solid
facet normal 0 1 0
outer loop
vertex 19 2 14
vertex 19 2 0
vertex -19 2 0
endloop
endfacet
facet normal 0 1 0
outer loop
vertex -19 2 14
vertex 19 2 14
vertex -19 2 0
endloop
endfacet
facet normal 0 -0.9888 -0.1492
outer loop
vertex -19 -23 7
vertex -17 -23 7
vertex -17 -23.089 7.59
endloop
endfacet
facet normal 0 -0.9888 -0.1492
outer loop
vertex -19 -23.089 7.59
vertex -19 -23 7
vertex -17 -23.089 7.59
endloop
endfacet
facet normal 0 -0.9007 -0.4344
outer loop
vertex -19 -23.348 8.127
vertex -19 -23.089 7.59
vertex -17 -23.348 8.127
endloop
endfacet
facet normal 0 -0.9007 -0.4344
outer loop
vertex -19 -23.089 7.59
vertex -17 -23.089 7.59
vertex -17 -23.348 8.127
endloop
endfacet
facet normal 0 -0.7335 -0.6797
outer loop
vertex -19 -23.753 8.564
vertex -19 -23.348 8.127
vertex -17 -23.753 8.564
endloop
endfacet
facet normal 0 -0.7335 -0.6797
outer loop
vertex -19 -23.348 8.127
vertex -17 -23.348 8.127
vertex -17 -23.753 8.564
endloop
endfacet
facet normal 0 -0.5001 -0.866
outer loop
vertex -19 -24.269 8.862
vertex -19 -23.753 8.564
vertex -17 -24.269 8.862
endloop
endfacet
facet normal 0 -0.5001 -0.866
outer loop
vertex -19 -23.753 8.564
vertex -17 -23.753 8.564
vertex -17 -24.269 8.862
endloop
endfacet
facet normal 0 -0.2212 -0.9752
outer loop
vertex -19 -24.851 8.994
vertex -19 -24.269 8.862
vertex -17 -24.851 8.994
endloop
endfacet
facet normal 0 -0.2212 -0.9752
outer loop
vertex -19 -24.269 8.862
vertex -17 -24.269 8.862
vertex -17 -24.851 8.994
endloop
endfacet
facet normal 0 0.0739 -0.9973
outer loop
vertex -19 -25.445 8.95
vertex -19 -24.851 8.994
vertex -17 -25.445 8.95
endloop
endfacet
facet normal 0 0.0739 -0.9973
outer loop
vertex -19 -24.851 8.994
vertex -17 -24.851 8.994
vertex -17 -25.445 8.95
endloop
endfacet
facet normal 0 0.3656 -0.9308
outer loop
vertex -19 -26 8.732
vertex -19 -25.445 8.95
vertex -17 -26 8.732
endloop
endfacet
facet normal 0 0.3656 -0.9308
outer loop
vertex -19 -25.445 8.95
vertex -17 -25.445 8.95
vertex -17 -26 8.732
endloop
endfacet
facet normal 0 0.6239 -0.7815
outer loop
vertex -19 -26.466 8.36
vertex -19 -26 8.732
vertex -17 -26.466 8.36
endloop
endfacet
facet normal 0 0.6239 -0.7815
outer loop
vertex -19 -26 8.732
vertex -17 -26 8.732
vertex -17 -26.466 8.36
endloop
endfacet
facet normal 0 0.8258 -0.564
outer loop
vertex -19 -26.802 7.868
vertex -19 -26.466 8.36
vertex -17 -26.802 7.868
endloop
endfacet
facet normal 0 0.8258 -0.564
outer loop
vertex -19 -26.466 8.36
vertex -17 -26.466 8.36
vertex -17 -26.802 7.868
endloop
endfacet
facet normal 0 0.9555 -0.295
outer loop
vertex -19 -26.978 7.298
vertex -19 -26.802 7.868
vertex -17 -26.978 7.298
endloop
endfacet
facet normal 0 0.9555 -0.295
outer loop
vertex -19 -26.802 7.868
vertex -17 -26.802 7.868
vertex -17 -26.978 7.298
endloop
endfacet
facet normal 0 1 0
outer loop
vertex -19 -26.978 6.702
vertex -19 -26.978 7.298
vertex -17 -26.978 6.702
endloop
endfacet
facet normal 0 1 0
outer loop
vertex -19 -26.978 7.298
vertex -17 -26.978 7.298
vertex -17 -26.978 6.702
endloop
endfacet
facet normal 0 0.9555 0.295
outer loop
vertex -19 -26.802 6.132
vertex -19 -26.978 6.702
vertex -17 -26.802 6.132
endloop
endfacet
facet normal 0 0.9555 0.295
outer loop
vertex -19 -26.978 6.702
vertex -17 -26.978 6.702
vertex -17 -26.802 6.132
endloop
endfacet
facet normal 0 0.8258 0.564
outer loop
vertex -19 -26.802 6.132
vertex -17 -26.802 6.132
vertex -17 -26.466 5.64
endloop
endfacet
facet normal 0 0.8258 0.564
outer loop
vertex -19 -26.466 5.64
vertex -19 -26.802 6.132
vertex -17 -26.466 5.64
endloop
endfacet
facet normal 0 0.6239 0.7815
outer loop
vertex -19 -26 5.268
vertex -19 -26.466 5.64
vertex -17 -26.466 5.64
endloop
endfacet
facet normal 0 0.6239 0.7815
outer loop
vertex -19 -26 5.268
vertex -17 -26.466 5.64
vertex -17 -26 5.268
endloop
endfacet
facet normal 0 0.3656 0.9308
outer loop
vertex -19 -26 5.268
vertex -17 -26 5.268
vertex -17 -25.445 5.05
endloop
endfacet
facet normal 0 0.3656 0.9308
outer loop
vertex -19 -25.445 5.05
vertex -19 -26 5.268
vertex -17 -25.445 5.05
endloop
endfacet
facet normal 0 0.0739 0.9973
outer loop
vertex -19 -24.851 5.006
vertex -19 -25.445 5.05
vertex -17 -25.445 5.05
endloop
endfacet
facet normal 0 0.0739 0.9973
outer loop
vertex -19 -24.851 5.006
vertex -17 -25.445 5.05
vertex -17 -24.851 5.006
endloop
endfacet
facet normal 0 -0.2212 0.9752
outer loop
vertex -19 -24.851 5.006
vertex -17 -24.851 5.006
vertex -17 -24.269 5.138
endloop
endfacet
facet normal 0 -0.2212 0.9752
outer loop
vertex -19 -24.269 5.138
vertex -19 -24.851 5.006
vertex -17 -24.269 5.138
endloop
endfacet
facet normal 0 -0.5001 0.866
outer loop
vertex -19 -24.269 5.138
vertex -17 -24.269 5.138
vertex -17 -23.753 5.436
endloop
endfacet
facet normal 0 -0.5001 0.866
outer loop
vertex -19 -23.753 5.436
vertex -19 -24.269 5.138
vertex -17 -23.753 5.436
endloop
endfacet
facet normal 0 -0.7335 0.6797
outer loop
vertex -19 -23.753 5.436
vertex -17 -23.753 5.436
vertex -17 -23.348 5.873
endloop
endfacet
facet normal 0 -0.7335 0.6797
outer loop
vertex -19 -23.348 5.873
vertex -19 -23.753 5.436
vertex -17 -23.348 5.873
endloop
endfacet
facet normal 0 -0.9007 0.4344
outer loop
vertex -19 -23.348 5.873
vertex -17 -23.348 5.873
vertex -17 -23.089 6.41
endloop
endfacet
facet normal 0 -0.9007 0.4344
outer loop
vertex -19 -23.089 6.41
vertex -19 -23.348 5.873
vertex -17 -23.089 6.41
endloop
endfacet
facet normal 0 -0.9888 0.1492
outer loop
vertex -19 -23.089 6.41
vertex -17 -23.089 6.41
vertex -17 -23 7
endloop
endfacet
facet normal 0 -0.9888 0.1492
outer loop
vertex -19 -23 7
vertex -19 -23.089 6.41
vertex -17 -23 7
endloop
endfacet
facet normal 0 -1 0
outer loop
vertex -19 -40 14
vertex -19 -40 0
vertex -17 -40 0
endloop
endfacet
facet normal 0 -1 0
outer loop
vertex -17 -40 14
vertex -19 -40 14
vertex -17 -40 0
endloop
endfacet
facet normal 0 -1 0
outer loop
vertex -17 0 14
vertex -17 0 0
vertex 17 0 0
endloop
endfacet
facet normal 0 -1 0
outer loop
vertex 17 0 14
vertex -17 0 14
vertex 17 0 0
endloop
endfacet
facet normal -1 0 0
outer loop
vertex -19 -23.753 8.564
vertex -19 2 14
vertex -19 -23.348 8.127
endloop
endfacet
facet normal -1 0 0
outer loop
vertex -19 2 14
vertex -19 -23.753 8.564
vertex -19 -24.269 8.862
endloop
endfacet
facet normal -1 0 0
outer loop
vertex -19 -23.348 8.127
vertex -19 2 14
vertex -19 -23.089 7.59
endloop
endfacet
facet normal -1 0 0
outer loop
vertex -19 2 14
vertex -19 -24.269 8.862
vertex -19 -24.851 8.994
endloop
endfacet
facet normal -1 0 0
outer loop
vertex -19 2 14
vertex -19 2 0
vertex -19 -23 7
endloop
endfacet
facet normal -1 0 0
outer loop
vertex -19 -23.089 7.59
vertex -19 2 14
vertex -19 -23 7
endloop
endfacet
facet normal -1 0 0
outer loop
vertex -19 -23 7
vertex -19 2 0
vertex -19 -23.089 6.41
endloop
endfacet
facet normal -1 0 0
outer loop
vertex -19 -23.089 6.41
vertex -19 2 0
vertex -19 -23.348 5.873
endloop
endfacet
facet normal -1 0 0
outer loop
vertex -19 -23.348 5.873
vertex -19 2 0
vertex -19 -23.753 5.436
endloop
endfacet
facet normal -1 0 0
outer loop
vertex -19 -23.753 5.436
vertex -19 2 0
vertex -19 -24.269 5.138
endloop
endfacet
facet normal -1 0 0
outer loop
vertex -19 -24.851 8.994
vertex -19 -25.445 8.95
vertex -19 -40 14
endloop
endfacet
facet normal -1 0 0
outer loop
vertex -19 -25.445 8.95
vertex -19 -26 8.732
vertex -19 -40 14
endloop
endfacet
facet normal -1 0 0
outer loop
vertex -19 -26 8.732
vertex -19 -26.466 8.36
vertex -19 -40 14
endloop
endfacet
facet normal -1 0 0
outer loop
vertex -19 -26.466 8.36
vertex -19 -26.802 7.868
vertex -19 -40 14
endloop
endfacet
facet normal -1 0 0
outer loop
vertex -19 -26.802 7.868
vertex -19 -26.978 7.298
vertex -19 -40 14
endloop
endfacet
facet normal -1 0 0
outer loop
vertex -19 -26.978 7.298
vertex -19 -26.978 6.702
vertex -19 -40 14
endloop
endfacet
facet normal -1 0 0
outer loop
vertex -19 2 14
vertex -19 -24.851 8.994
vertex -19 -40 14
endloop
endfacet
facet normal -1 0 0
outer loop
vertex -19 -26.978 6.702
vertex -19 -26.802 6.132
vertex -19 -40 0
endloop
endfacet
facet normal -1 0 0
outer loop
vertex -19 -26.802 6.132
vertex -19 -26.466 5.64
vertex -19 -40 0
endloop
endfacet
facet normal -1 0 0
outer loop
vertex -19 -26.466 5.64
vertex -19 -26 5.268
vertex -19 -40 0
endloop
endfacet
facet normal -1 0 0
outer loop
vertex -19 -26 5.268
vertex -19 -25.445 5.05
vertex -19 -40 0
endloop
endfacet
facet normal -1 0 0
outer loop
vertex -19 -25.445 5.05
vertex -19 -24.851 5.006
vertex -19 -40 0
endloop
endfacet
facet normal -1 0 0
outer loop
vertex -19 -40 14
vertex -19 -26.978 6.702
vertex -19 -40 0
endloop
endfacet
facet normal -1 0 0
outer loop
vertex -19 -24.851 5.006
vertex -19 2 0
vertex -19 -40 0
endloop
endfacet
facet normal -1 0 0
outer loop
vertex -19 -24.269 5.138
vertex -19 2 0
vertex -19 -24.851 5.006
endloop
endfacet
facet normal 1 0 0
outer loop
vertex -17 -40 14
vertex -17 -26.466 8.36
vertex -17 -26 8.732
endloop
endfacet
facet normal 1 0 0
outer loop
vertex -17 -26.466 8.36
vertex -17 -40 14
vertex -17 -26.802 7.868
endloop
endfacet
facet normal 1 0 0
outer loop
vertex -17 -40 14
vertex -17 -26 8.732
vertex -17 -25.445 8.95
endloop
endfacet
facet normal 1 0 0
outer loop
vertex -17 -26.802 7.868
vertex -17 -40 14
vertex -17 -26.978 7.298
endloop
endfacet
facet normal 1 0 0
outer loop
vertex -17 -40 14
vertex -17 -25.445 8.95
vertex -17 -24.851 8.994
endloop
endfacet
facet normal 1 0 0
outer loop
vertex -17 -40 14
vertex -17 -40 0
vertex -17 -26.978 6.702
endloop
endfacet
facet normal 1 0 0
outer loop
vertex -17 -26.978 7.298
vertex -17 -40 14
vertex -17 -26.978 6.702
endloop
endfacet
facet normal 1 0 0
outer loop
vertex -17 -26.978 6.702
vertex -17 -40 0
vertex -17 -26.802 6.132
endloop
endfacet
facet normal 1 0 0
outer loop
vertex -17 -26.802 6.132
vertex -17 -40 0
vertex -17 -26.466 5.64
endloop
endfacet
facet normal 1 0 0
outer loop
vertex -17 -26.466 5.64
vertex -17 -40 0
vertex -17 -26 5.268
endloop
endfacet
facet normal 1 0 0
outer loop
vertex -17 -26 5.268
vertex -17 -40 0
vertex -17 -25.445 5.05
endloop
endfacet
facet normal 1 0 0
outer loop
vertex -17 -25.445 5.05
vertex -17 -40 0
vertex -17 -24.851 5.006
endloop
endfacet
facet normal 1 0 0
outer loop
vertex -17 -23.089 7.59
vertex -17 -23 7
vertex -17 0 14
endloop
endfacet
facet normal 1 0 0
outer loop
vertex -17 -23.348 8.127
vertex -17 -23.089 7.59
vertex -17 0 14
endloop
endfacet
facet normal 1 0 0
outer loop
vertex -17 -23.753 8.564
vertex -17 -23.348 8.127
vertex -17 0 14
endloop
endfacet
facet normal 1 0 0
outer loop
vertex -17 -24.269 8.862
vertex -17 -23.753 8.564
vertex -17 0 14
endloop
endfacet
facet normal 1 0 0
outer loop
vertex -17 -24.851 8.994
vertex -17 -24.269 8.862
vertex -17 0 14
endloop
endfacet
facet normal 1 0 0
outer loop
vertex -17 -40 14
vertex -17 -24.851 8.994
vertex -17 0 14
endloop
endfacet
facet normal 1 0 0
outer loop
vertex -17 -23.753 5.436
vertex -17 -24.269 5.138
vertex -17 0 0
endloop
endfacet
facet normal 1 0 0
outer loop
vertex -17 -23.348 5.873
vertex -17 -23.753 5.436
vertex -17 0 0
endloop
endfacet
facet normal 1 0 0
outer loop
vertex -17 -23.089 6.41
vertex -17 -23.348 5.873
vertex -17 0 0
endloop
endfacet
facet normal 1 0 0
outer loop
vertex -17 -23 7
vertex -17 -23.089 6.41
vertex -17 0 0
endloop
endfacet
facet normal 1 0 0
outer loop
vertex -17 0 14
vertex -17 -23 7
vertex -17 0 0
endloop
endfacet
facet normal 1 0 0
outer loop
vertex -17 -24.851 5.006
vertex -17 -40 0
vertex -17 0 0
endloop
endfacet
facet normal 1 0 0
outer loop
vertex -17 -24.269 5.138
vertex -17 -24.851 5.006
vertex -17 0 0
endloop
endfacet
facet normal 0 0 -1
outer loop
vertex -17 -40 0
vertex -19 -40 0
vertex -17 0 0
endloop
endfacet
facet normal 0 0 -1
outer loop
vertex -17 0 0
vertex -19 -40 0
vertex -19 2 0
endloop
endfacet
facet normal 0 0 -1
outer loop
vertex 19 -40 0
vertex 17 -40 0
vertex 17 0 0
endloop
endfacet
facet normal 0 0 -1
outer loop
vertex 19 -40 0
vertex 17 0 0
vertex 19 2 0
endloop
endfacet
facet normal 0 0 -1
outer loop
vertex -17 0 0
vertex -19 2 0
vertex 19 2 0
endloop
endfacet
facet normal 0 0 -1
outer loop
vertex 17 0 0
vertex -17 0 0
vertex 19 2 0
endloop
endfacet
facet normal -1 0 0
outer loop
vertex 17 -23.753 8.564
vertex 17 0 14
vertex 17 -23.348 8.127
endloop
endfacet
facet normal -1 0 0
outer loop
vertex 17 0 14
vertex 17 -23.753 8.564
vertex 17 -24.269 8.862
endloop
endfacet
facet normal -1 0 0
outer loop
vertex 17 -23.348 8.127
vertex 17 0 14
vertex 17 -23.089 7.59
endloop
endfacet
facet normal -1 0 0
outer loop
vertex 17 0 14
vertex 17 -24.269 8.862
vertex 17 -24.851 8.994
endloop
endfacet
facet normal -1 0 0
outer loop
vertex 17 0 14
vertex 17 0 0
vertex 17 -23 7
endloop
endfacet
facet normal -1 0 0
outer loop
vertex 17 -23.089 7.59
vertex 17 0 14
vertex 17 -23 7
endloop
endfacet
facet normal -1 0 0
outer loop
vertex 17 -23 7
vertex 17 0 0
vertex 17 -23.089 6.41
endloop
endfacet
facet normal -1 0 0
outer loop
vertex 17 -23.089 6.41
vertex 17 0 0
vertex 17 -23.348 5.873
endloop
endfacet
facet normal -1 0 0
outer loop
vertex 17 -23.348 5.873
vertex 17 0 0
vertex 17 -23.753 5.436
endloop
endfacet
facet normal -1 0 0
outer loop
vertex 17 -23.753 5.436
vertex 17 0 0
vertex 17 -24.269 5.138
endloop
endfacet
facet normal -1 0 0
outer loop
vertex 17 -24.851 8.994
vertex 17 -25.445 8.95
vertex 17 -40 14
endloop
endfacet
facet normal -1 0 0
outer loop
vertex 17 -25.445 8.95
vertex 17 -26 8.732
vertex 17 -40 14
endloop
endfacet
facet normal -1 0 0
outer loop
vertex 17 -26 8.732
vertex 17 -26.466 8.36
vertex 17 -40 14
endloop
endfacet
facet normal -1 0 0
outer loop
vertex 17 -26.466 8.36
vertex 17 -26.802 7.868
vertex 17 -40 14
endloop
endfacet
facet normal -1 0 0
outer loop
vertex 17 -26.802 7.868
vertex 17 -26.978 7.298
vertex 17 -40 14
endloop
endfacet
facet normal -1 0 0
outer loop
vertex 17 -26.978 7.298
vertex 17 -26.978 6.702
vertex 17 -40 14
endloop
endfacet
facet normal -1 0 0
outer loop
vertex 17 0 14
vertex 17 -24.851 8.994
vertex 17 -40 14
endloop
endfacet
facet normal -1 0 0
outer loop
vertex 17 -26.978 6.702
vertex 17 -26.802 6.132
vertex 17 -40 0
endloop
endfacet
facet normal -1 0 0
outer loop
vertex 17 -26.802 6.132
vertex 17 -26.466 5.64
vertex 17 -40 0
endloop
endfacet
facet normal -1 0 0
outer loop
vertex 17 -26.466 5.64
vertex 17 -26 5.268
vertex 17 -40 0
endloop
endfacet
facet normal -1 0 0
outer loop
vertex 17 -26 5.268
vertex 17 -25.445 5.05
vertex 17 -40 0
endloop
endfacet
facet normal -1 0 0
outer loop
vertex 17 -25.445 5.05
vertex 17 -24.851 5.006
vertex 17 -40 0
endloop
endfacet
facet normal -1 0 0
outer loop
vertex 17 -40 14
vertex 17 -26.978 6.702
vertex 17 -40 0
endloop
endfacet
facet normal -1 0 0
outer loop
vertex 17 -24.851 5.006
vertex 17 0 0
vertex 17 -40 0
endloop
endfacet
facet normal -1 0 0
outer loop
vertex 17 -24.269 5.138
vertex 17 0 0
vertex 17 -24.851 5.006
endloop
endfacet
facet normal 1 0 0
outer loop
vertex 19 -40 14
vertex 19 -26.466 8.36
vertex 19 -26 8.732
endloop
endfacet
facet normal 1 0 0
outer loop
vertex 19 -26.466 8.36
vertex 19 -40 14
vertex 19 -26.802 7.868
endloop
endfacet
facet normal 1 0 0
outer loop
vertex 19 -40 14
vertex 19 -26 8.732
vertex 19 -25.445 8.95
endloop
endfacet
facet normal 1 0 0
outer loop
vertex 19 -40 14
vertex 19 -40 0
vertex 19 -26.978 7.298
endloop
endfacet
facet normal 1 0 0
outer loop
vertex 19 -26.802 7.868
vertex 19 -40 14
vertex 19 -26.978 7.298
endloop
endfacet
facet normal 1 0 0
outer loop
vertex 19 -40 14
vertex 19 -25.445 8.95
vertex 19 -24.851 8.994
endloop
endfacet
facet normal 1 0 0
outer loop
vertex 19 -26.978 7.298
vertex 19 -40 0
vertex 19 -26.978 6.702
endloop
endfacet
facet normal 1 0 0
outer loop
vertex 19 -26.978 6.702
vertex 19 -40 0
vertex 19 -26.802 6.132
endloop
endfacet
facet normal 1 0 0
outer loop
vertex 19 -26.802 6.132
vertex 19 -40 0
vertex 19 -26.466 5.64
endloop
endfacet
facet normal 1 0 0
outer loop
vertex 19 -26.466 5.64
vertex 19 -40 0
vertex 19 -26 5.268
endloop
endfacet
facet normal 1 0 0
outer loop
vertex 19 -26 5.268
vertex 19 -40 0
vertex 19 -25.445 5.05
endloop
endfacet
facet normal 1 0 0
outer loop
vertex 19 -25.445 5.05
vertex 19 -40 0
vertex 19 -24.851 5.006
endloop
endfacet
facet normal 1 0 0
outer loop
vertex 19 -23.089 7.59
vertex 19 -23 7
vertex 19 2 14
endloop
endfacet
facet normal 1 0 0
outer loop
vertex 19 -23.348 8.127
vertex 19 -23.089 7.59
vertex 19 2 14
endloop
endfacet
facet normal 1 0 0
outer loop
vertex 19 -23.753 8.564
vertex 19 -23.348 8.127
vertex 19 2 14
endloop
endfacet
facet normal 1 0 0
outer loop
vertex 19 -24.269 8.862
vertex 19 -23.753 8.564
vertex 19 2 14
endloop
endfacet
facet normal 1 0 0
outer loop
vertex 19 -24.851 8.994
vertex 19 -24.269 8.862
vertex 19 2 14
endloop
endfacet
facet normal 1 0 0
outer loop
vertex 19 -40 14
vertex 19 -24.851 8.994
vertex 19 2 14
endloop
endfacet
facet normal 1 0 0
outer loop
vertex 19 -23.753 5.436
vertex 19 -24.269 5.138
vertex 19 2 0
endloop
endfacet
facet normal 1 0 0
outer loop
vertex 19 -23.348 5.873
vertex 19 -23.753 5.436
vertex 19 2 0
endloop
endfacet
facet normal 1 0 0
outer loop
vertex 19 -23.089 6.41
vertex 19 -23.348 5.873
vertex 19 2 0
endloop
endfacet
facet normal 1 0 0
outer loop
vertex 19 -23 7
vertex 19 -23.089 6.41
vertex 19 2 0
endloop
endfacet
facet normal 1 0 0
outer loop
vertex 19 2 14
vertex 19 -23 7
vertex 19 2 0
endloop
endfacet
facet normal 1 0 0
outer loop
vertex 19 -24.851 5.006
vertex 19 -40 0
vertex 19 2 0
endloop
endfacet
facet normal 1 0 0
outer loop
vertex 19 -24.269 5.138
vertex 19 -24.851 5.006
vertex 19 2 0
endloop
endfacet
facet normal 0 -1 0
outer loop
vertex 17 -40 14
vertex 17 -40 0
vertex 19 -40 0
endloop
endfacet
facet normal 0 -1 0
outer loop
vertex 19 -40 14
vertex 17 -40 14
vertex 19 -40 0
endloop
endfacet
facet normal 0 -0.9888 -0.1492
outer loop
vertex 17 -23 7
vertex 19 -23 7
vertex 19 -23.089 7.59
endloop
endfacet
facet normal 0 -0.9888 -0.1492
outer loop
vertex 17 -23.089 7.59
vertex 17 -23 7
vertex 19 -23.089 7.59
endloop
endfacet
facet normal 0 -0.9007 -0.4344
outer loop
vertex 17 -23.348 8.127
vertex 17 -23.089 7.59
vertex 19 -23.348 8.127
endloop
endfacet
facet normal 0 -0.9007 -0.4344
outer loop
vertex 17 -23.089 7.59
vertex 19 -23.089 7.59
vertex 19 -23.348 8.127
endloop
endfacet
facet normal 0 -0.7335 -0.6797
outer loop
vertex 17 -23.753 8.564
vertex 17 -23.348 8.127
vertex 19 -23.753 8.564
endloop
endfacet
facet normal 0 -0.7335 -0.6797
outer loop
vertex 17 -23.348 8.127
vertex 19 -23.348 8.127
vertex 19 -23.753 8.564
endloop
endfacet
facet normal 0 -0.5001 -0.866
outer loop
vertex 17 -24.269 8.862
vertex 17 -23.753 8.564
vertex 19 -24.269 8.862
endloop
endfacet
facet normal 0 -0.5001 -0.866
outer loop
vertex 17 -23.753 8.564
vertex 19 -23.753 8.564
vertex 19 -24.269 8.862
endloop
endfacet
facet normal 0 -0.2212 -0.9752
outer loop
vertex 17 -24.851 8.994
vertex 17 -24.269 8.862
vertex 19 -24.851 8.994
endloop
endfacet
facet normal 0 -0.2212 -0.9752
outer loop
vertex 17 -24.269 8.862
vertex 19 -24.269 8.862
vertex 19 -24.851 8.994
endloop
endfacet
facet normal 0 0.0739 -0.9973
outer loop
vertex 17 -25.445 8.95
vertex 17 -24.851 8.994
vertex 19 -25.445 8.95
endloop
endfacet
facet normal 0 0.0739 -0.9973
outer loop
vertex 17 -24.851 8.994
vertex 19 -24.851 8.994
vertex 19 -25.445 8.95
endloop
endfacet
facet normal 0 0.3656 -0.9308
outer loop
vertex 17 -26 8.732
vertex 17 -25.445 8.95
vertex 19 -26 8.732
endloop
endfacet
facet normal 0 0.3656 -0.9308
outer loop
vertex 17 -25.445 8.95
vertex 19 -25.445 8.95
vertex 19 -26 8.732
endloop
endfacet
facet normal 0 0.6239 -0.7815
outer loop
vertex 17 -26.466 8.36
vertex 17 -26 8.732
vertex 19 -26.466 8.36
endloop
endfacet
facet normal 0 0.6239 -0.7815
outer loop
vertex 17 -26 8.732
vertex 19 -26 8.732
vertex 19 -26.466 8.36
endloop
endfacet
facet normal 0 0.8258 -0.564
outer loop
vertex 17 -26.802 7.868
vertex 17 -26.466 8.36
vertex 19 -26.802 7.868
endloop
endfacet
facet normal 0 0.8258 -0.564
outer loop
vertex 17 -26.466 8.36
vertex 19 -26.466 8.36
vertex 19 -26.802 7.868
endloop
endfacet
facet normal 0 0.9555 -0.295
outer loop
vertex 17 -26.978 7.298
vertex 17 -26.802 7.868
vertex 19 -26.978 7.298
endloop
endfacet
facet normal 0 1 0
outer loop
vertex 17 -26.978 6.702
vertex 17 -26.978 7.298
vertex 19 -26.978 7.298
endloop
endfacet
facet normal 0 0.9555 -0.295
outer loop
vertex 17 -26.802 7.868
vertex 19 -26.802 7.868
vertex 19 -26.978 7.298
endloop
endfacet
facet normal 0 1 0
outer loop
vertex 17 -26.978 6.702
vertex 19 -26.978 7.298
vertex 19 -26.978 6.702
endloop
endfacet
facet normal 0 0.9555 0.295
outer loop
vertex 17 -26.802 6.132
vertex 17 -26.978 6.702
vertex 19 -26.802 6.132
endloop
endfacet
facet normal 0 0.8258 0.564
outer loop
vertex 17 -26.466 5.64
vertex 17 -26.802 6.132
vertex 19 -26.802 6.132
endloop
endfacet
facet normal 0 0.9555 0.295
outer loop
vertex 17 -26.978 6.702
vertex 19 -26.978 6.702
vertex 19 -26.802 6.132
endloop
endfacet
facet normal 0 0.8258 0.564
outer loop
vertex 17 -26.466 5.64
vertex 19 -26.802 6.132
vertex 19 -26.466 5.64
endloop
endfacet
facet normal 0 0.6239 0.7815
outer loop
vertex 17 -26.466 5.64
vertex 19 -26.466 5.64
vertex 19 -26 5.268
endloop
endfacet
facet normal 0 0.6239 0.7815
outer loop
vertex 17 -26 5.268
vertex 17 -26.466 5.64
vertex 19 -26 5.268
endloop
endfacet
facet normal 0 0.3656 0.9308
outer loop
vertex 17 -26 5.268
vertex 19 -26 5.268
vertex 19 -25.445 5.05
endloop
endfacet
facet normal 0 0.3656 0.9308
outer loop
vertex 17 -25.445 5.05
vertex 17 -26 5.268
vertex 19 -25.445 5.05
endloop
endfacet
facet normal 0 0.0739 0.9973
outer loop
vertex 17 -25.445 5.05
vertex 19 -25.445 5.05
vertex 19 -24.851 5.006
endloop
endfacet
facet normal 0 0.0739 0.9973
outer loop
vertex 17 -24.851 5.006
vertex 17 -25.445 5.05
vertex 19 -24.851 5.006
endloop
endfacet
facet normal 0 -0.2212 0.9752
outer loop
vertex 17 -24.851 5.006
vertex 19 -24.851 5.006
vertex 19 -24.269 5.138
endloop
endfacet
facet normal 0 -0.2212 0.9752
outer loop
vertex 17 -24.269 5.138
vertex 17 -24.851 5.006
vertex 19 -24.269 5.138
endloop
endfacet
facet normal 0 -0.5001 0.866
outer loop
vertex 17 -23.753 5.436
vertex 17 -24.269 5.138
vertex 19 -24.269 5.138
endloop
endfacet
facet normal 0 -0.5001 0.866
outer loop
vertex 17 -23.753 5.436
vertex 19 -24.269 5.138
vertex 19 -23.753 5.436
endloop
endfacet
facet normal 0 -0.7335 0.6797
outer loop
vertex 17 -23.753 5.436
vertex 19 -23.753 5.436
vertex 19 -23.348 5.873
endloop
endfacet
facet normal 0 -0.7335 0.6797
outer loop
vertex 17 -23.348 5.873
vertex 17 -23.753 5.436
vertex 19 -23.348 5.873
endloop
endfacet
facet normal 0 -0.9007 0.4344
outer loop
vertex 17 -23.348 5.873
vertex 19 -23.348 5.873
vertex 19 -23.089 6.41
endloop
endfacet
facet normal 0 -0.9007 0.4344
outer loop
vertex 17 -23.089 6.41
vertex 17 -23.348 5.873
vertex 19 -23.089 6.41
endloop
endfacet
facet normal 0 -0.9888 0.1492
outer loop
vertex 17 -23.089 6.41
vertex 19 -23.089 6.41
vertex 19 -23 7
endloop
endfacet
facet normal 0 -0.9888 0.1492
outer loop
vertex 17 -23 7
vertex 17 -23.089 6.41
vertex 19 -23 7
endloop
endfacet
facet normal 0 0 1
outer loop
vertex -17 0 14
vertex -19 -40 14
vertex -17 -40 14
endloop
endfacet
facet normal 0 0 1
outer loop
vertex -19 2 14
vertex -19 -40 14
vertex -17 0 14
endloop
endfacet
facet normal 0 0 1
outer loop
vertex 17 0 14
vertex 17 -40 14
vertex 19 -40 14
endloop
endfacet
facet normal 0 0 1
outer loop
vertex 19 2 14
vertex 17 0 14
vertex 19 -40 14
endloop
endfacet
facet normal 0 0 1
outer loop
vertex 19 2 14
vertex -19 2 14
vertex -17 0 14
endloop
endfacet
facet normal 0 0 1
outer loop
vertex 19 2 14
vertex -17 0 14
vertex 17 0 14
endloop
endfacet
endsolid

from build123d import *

# Parameters (mm, degrees)
PAD_DEPTH    = 14
SKETCH001_R  = 2
POCKET_DEPTH = 38.001


with BuildPart() as part:
    # Sketch → Pad (new body)
    with BuildSketch(Plane.XY):
        Polygon((-17, -40), (-17, 0), (17, 0), (17, -40), (19, -40), (19, 2), (-19, 2), (-19, -40), align=None)
    extrude(amount=PAD_DEPTH)

    # Sketch001 (on Face5 of Pad) → Pocket (cut, through all)
    with BuildSketch(Plane.YZ.offset(19)):
        with Locations((-25, 7)):
            Circle(SKETCH001_R)
    extrude(amount=-POCKET_DEPTH, mode=Mode.SUBTRACT)


solid = part.part
